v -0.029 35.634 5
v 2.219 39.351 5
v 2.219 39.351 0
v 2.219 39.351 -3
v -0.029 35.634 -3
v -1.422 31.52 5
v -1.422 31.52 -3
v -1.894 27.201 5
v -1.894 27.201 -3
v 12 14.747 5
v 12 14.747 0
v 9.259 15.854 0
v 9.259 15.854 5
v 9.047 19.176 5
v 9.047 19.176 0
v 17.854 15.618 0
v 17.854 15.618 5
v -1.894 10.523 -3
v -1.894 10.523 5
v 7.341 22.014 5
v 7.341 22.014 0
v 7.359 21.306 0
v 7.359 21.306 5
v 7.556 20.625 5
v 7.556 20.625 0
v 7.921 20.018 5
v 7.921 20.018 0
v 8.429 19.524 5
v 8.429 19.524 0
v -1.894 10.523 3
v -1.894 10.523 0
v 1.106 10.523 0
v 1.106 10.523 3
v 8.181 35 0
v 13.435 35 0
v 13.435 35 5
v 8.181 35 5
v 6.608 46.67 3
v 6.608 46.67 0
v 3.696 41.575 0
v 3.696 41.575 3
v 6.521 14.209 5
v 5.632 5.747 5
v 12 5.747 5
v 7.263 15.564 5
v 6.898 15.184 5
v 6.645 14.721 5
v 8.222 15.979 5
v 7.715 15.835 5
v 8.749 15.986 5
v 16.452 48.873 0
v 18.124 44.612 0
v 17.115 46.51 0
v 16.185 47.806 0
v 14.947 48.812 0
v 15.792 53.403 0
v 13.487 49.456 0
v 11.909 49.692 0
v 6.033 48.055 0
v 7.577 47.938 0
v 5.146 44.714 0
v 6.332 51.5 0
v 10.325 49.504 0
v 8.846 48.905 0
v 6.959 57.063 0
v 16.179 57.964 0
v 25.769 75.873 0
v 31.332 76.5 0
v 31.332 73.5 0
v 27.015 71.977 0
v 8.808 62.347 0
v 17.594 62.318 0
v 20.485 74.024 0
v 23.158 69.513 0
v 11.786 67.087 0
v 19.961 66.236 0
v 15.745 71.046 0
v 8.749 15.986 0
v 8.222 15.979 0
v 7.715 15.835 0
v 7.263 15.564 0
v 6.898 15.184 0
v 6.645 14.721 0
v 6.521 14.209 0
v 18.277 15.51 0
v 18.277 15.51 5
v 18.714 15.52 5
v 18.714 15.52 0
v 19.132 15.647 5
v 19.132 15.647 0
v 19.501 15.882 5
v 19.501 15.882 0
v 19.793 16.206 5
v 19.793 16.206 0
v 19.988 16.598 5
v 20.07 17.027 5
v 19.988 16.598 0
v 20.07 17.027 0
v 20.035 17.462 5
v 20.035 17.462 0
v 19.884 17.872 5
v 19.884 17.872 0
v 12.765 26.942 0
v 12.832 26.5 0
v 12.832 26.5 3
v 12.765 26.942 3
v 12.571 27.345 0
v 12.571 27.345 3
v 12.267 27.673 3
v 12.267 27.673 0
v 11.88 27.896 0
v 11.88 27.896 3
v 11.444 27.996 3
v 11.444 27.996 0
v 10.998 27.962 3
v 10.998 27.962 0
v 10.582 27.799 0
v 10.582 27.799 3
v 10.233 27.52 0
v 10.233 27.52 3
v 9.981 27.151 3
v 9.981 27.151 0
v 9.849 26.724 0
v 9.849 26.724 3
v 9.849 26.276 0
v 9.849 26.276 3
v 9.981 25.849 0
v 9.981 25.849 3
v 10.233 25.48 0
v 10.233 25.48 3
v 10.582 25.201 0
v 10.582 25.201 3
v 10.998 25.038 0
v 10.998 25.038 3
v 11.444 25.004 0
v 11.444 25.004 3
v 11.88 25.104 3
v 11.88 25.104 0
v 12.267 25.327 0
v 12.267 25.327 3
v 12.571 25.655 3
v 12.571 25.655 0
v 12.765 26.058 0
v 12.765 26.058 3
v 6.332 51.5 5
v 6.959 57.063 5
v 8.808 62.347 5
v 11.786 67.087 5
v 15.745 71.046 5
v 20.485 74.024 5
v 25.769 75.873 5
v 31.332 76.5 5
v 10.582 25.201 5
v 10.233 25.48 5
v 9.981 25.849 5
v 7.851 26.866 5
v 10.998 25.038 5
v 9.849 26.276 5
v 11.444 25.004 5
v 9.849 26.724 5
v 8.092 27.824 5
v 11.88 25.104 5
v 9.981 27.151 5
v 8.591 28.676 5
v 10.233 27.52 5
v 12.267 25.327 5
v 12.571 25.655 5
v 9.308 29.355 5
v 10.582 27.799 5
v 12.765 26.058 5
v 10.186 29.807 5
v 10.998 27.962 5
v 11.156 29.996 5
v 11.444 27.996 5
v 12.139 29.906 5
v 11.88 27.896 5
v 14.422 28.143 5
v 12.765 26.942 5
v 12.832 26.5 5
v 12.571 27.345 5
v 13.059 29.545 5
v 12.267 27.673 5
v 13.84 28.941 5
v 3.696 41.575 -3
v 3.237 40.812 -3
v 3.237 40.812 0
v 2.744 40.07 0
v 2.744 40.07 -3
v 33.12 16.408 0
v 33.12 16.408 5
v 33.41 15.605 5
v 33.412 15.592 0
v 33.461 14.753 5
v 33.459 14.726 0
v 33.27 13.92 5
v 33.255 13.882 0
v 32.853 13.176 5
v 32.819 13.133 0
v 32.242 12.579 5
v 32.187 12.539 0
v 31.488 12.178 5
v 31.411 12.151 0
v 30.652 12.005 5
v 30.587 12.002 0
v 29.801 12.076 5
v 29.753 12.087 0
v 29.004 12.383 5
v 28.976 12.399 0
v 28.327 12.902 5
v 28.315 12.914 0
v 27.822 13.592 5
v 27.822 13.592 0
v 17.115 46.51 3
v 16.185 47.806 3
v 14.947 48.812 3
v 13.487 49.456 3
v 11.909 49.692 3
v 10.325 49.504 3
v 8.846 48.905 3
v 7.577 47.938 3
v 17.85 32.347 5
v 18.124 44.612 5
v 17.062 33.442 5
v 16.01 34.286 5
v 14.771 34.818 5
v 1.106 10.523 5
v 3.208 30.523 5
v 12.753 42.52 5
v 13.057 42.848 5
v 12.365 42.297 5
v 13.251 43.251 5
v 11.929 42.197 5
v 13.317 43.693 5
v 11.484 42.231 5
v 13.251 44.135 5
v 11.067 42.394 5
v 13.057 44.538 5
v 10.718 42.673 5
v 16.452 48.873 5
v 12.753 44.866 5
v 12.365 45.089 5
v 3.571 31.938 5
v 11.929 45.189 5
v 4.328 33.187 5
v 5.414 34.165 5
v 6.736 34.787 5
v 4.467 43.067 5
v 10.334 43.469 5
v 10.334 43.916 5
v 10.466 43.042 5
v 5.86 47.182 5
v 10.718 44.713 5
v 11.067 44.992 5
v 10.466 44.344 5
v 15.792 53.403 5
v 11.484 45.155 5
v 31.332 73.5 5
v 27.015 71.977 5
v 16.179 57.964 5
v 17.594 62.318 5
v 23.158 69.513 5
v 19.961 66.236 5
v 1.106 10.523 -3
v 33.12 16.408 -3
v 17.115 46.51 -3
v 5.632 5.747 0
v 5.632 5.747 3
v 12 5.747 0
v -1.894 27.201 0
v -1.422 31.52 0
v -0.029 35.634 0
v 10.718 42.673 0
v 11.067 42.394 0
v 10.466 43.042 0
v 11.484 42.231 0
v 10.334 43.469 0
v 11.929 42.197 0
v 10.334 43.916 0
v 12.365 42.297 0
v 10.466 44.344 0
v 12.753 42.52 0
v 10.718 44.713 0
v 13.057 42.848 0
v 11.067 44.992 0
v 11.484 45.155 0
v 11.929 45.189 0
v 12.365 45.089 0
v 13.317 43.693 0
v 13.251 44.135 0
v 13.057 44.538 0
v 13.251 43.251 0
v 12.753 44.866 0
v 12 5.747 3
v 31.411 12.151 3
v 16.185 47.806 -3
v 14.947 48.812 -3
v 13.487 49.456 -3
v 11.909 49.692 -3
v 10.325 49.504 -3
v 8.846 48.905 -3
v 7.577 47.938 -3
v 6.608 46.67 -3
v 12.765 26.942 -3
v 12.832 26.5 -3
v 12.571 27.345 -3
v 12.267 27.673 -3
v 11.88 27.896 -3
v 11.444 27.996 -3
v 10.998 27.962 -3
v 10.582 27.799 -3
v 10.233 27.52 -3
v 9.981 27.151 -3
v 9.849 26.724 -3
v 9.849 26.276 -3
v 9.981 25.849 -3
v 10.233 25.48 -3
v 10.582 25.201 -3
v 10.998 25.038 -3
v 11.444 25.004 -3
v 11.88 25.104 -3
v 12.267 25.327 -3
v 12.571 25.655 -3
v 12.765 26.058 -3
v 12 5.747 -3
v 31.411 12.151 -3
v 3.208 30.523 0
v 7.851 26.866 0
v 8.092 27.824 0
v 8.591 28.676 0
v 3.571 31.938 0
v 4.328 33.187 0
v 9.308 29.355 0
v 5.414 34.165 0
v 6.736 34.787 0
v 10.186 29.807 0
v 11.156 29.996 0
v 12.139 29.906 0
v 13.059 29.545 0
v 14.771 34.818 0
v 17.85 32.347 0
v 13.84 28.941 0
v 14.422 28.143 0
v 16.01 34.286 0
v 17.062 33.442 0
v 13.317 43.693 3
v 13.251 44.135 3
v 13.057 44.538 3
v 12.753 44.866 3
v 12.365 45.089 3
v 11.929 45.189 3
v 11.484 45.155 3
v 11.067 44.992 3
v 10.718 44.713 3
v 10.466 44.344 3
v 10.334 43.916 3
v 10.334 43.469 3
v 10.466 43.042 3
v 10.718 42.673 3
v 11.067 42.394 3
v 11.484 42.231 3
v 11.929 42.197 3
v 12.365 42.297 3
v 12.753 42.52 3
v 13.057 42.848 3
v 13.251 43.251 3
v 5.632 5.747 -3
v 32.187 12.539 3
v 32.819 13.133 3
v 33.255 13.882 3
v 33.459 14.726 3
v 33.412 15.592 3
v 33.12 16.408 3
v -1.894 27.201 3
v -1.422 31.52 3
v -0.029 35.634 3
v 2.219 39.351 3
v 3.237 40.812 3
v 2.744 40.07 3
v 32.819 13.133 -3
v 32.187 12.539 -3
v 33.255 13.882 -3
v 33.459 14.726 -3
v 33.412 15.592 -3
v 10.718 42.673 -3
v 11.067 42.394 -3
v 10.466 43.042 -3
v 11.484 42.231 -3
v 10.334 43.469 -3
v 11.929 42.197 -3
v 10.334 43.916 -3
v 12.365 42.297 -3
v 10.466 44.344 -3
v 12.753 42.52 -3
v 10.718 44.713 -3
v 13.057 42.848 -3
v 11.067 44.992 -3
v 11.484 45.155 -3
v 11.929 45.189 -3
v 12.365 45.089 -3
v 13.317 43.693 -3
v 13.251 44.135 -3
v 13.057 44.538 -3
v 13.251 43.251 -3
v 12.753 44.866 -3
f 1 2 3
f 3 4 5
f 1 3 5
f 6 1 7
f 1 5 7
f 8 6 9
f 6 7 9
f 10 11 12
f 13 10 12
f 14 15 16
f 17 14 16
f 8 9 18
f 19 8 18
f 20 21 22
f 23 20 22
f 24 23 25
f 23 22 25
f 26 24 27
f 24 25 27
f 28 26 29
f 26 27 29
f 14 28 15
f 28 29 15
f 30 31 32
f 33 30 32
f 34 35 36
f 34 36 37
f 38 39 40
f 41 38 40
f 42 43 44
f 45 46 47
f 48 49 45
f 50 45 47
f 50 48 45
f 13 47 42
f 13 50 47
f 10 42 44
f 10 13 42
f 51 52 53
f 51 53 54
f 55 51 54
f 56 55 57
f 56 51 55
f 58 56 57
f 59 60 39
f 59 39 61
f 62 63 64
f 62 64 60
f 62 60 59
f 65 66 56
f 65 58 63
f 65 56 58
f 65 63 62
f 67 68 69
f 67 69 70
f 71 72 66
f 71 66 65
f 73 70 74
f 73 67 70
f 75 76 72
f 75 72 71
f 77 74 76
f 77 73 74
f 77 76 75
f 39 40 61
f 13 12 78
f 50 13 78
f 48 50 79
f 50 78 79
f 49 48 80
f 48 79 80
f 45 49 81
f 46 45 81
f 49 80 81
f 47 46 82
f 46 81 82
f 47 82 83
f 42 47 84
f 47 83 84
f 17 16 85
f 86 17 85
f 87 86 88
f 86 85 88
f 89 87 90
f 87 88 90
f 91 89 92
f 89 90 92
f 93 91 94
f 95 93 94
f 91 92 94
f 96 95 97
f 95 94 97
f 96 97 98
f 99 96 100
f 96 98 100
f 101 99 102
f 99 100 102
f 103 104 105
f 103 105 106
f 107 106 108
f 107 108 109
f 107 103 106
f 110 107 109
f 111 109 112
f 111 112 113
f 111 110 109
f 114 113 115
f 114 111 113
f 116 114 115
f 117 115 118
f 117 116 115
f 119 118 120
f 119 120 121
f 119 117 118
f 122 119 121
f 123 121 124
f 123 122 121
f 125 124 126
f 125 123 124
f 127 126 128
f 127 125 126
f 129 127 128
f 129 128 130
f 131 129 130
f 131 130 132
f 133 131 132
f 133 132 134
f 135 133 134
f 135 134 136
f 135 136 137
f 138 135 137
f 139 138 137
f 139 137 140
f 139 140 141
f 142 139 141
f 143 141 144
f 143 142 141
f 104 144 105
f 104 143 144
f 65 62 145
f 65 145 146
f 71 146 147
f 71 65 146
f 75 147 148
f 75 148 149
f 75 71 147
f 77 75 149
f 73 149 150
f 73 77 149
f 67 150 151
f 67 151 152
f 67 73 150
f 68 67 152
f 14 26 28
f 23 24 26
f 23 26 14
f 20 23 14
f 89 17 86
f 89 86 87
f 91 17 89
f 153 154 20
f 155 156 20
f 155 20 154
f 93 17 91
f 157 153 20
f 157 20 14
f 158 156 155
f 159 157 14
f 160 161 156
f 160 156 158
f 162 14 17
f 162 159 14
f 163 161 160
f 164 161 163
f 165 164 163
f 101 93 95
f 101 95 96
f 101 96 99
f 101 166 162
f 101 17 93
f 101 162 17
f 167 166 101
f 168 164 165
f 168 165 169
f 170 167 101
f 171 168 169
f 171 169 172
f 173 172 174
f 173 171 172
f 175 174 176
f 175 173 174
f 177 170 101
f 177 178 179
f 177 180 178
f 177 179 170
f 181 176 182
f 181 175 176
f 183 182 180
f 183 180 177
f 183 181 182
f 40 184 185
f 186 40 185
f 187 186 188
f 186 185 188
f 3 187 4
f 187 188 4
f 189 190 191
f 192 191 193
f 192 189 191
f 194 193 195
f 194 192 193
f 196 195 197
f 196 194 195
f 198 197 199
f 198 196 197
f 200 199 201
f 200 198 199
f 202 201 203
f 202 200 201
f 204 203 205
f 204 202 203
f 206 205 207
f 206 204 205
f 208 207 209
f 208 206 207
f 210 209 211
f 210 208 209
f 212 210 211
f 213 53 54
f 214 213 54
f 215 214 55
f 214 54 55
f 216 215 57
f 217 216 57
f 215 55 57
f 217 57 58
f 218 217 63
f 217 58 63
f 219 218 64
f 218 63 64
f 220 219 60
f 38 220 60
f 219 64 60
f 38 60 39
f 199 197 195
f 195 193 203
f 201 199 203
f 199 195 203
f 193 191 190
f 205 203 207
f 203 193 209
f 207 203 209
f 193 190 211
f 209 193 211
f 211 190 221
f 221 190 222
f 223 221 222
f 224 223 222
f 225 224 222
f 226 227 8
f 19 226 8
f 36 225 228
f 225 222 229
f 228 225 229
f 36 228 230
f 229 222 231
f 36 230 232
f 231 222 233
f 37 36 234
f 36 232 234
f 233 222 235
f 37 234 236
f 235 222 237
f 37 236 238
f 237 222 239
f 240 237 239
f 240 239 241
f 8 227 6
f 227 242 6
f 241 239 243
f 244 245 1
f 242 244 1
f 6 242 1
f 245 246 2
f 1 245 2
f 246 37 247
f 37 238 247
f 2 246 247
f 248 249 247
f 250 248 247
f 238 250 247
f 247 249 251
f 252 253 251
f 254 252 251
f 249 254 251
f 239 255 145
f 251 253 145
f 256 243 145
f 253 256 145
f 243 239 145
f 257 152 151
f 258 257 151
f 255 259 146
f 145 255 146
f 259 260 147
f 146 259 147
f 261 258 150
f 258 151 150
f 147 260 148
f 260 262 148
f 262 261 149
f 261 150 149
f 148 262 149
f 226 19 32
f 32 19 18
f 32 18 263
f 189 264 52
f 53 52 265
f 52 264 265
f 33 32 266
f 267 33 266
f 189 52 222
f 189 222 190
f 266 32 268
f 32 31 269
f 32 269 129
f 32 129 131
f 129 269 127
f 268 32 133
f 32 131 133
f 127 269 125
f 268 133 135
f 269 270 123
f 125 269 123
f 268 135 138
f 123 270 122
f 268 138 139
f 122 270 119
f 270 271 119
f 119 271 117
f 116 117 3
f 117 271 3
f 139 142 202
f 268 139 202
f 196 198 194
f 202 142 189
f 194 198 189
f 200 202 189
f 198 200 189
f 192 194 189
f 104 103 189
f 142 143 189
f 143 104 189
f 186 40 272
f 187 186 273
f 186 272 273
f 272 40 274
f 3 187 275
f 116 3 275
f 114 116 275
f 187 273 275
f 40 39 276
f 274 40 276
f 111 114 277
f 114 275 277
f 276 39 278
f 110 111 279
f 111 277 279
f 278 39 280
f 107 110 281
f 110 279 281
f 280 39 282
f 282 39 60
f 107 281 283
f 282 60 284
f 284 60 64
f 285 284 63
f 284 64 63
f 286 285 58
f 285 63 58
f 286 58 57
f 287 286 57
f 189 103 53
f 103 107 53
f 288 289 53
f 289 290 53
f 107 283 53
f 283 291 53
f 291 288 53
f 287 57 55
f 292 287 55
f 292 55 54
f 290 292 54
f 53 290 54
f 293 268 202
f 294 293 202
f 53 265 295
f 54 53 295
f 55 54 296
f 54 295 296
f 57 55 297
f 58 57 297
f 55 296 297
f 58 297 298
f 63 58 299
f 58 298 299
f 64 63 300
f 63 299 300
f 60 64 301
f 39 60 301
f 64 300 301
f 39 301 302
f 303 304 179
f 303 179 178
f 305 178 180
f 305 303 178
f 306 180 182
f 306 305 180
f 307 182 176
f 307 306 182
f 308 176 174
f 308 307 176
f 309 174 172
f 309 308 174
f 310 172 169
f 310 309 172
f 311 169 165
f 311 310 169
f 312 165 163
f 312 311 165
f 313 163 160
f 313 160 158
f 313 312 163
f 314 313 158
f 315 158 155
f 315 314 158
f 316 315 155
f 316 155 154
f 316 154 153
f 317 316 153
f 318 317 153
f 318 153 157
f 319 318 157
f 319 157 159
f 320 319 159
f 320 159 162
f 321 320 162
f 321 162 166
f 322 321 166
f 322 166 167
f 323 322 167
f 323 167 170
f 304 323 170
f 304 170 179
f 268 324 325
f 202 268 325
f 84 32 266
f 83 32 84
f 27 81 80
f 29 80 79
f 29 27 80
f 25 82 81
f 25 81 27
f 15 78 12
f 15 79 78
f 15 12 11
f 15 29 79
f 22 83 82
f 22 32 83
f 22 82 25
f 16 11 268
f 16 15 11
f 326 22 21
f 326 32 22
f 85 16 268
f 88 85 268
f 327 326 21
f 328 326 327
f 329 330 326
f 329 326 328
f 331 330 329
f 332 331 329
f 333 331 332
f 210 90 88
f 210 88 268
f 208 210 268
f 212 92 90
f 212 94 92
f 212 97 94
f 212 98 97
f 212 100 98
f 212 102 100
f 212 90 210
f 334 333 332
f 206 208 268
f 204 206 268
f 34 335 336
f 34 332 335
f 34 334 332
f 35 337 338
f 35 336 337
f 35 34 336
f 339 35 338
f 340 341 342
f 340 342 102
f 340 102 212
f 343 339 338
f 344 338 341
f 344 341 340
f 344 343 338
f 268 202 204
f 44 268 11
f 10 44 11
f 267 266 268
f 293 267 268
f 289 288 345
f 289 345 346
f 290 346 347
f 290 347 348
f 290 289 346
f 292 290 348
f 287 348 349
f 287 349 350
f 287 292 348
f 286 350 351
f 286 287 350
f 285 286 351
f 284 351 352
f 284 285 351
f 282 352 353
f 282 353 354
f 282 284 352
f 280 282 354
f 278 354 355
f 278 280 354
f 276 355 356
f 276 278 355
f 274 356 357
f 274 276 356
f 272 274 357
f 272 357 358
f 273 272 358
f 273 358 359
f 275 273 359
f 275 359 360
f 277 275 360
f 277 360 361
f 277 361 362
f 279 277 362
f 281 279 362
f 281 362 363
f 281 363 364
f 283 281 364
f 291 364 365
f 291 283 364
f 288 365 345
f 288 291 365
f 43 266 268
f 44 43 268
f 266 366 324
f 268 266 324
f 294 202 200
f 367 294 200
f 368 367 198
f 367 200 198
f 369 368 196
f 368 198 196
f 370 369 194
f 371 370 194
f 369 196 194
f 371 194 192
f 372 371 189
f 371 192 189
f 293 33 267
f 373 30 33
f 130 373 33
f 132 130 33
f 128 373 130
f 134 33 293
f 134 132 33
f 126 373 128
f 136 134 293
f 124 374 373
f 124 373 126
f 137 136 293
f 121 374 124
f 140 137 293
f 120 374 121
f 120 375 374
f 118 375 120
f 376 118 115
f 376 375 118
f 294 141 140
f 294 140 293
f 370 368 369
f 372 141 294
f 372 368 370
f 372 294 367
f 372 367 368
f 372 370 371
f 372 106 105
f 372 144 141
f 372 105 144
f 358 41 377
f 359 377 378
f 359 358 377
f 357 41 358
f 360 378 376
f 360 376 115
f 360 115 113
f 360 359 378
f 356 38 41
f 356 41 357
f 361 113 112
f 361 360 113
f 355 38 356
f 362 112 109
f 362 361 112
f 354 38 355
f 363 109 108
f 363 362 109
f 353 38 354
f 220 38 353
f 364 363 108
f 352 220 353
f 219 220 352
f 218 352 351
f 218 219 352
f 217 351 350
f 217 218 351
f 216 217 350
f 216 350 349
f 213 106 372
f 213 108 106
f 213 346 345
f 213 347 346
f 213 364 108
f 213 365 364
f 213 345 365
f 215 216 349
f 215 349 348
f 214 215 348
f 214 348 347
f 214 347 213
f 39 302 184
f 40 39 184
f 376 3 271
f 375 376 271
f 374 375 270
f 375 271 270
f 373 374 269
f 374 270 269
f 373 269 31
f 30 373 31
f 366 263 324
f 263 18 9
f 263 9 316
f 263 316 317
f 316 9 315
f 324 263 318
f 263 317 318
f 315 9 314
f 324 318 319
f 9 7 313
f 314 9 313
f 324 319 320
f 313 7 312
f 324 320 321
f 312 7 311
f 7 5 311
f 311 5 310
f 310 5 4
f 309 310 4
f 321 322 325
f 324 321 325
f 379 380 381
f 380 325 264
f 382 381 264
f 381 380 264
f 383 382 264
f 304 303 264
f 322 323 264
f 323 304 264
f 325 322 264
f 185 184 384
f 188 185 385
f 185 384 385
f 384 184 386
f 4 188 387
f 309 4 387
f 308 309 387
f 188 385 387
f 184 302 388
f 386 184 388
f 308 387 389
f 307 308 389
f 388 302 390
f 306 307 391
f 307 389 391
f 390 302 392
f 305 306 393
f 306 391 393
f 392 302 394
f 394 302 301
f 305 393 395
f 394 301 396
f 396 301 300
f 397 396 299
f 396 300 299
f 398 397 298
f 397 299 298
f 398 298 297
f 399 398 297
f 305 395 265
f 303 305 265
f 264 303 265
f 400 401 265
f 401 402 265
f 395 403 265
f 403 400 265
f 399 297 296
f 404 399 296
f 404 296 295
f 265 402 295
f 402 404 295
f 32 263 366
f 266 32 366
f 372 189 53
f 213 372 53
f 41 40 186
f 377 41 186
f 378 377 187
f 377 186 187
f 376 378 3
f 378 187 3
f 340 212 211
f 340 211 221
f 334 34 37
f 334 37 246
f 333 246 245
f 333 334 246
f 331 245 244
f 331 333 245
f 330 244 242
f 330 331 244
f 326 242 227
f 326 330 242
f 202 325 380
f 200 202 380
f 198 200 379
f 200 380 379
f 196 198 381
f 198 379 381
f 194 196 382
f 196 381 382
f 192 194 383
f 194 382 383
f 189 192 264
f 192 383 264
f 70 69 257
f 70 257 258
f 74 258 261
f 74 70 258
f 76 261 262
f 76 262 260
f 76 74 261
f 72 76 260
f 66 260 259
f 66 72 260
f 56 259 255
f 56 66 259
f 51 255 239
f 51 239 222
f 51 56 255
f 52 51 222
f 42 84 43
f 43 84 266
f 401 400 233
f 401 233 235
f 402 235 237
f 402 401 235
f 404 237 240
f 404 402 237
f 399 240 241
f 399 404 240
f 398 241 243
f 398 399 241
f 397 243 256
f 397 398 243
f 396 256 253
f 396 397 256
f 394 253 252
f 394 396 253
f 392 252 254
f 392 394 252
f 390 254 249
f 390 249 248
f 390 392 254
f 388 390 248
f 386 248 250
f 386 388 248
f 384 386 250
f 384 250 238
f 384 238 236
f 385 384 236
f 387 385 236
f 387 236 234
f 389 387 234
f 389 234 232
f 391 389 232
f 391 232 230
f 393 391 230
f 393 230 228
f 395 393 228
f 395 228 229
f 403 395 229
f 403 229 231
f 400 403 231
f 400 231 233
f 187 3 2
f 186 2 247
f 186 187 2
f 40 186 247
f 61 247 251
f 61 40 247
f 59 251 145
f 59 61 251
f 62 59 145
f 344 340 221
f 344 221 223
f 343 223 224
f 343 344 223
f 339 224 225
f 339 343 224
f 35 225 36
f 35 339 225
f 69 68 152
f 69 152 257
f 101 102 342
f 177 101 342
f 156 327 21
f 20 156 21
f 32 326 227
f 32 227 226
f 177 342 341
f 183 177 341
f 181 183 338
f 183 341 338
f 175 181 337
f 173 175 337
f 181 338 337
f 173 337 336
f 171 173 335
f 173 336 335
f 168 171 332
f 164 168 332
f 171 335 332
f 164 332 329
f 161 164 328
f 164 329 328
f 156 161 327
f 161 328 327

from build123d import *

# Parameters (mm, degrees)
CROQUIS4_R                = 1.5
SALIENTE_EXTRUIR1_DEPTH   = 5
SALIENTE_EXTRUIR1_2_DEPTH = 5
SALIENTE_EXTRUIR1_3_DEPTH = 5
SALIENTE_EXTRUIR2_START   = -3
CROQUIS5_R                = 1.5
SALIENTE_EXTRUIR2_DEPTH   = 3
CROQUIS6_R                = 1.5
SALIENTE_EXTRUIR3_DEPTH   = 3


with BuildPart() as part:
    # Croquis4 → Saliente-Extruir1 (new body)
    with BuildSketch(Plane.XY):
        with BuildLine():
            Line((31.332082611, 76.5), (31.332082611, 73.5))
            ThreePointArc((31.332082611, 73.5), (17.593960897, 62.317888205), (18.123970441, 44.612106598))
            Line((18.123970441, 44.612106598), (33.120139436, 16.408414688))
            ThreePointArc((33.120139436, 16.408414688), (31.879711346, 12.351157221), (27.822453879, 13.591585312))
            Line((27.822453879, 13.591585312), (17.849832742, 32.347357814))
            ThreePointArc((17.849832742, 32.347357814), (16.010285152, 34.285836504), (13.435094777, 35))
            Line((13.435094777, 35), (8.180668456, 35))
            ThreePointArc((8.180668456, 35), (4.835015424, 33.715724127), (3.208058979, 30.522642316))
            Line((3.208058979, 30.522642316), (1.105974274, 10.522642316))
            Line((1.105974274, 10.522642316), (-1.894025726, 10.522642316))
            Line((-1.894025726, 10.522642316), (-1.894025726, 27.20144431))
            ThreePointArc((-1.894025726, 27.20144431), (-0.837875871, 33.61475404), (2.219028442, 39.350722155))
            ThreePointArc((2.219028442, 39.350722155), (5.275932756, 45.086690271), (6.332082611, 51.5))
            ThreePointArc((6.332082611, 51.5), (13.654413081, 69.17766953), (31.332082611, 76.5))
        make_face()
        with Locations((11.817302712, 43.692896695)):
            Circle(CROQUIS4_R, mode=Mode.SUBTRACT)
    extrude(amount=SALIENTE_EXTRUIR1_DEPTH)



with BuildPart() as body_2:
    # Croquis4 → Saliente-Extruir1 2 (new body)
    with BuildSketch(Plane.XY):
        with BuildLine():
            Line((7.851255977, 26.865849621), (7.341304596, 22.013986331))
            ThreePointArc((7.341304596, 22.013986331), (7.719149951, 20.309636075), (9.046614258, 19.17587445))
            Line((9.046614258, 19.17587445), (17.853810231, 15.617536301))
            ThreePointArc((17.853810231, 15.617536301), (19.658030518, 16.034073375), (19.883693385, 17.871949935))
            Line((19.883693385, 17.871949935), (14.422399186, 28.14315047))
            ThreePointArc((14.422399186, 28.14315047), (10.664251127, 29.935695142), (7.851255977, 26.865849621))
        make_face()
        with Locations((11.332082611, 26.5)):
            Circle(CROQUIS4_R, mode=Mode.SUBTRACT)
    extrude(amount=SALIENTE_EXTRUIR1_2_DEPTH)


with BuildPart() as body_3:
    # Croquis4 → Saliente-Extruir1 3 (new body)
    with BuildSketch(Plane.XY):
        with BuildLine():
            Line((6.52097346, 14.209056927), (5.631578058, 5.747024927))
            Line((5.631578058, 5.747024927), (12, 5.747024927))
            Line((12, 5.747024927), (12, 14.747024927))
            Line((12, 14.747024927), (9.259230437, 15.854367709))
            ThreePointArc((9.259230437, 15.854367709), (7.479941101, 15.714334601), (6.52097346, 14.209056927))
        make_face()
    extrude(amount=SALIENTE_EXTRUIR1_3_DEPTH)


with BuildPart() as part_1:
    add(part.part)

    add(body_2.part)  # Saliente-Extruir2 merges body 2

    add(body_3.part)  # Saliente-Extruir2 merges body 3
    # Croquis5 → Saliente-Extruir2 (add)
    with BuildSketch(Plane.XY.offset(SALIENTE_EXTRUIR2_START)):
        with BuildLine():
            Line((12, 5.747024927), (31.411206338, 12.151040577))
            ThreePointArc((31.411206338, 12.151040577), (33.255375434, 13.882455653), (33.120139436, 16.408414688))
            Line((33.120139436, 16.408414688), (17.114988269, 46.509726071))
            ThreePointArc((17.114988269, 46.509726071), (11.909057427, 49.692195076), (6.608237363, 46.670418851))
            Line((6.608237363, 46.670418851), (3.695633773, 41.574926144))
            ThreePointArc((3.695633773, 41.574926144), (2.994485151, 40.43815831), (2.219028442, 39.350722155))
            ThreePointArc((2.219028442, 39.350722155), (-0.837875871, 33.61475404), (-1.894025726, 27.20144431))
            Line((-1.894025726, 27.20144431), (-1.894025726, 10.522642316))
            Line((-1.894025726, 10.522642316), (1.105974274, 10.522642316))
            Line((1.105974274, 10.522642316), (5.631578058, 5.747024927))
            Line((5.631578058, 5.747024927), (12, 5.747024927))
        make_face()
        with Locations((11.332082611, 26.5)):
            Circle(CROQUIS5_R, mode=Mode.SUBTRACT)
        with Locations((11.817302712, 43.692896695)):
            Circle(CROQUIS5_R, mode=Mode.SUBTRACT)
    extrude(amount=SALIENTE_EXTRUIR2_DEPTH)


with BuildPart() as body_2_2:
    # Croquis6 → Saliente-Extruir3 (new body)
    with BuildSketch(Plane.XY):
        with BuildLine():
            Line((33.120139436, 16.408414688), (17.114988269, 46.509726071))
            ThreePointArc((17.114988269, 46.509726071), (11.909057427, 49.692195076), (6.608237363, 46.670418851))
            Line((6.608237363, 46.670418851), (3.695633773, 41.574926144))
            ThreePointArc((3.695633773, 41.574926144), (2.994485151, 40.43815831), (2.219028442, 39.350722155))
            ThreePointArc((2.219028442, 39.350722155), (-0.837875871, 33.61475404), (-1.894025726, 27.20144431))
            Line((-1.894025726, 27.20144431), (-1.894025726, 10.522642316))
            Line((-1.894025726, 10.522642316), (1.105974274, 10.522642316))
            Line((1.105974274, 10.522642316), (5.631578058, 5.747024927))
            Line((5.631578058, 5.747024927), (12, 5.747024927))
            Line((12, 5.747024927), (31.411206338, 12.151040577))
            ThreePointArc((31.411206338, 12.151040577), (33.255375434, 13.882455653), (33.120139436, 16.408414688))
        make_face()
        with Locations((11.817302712, 43.692896695)):
            Circle(CROQUIS6_R, mode=Mode.SUBTRACT)
        with Locations((11.332082611, 26.5)):
            Circle(CROQUIS6_R, mode=Mode.SUBTRACT)
    extrude(amount=SALIENTE_EXTRUIR3_DEPTH)


solid = Compound([part_1.part, body_2_2.part])
